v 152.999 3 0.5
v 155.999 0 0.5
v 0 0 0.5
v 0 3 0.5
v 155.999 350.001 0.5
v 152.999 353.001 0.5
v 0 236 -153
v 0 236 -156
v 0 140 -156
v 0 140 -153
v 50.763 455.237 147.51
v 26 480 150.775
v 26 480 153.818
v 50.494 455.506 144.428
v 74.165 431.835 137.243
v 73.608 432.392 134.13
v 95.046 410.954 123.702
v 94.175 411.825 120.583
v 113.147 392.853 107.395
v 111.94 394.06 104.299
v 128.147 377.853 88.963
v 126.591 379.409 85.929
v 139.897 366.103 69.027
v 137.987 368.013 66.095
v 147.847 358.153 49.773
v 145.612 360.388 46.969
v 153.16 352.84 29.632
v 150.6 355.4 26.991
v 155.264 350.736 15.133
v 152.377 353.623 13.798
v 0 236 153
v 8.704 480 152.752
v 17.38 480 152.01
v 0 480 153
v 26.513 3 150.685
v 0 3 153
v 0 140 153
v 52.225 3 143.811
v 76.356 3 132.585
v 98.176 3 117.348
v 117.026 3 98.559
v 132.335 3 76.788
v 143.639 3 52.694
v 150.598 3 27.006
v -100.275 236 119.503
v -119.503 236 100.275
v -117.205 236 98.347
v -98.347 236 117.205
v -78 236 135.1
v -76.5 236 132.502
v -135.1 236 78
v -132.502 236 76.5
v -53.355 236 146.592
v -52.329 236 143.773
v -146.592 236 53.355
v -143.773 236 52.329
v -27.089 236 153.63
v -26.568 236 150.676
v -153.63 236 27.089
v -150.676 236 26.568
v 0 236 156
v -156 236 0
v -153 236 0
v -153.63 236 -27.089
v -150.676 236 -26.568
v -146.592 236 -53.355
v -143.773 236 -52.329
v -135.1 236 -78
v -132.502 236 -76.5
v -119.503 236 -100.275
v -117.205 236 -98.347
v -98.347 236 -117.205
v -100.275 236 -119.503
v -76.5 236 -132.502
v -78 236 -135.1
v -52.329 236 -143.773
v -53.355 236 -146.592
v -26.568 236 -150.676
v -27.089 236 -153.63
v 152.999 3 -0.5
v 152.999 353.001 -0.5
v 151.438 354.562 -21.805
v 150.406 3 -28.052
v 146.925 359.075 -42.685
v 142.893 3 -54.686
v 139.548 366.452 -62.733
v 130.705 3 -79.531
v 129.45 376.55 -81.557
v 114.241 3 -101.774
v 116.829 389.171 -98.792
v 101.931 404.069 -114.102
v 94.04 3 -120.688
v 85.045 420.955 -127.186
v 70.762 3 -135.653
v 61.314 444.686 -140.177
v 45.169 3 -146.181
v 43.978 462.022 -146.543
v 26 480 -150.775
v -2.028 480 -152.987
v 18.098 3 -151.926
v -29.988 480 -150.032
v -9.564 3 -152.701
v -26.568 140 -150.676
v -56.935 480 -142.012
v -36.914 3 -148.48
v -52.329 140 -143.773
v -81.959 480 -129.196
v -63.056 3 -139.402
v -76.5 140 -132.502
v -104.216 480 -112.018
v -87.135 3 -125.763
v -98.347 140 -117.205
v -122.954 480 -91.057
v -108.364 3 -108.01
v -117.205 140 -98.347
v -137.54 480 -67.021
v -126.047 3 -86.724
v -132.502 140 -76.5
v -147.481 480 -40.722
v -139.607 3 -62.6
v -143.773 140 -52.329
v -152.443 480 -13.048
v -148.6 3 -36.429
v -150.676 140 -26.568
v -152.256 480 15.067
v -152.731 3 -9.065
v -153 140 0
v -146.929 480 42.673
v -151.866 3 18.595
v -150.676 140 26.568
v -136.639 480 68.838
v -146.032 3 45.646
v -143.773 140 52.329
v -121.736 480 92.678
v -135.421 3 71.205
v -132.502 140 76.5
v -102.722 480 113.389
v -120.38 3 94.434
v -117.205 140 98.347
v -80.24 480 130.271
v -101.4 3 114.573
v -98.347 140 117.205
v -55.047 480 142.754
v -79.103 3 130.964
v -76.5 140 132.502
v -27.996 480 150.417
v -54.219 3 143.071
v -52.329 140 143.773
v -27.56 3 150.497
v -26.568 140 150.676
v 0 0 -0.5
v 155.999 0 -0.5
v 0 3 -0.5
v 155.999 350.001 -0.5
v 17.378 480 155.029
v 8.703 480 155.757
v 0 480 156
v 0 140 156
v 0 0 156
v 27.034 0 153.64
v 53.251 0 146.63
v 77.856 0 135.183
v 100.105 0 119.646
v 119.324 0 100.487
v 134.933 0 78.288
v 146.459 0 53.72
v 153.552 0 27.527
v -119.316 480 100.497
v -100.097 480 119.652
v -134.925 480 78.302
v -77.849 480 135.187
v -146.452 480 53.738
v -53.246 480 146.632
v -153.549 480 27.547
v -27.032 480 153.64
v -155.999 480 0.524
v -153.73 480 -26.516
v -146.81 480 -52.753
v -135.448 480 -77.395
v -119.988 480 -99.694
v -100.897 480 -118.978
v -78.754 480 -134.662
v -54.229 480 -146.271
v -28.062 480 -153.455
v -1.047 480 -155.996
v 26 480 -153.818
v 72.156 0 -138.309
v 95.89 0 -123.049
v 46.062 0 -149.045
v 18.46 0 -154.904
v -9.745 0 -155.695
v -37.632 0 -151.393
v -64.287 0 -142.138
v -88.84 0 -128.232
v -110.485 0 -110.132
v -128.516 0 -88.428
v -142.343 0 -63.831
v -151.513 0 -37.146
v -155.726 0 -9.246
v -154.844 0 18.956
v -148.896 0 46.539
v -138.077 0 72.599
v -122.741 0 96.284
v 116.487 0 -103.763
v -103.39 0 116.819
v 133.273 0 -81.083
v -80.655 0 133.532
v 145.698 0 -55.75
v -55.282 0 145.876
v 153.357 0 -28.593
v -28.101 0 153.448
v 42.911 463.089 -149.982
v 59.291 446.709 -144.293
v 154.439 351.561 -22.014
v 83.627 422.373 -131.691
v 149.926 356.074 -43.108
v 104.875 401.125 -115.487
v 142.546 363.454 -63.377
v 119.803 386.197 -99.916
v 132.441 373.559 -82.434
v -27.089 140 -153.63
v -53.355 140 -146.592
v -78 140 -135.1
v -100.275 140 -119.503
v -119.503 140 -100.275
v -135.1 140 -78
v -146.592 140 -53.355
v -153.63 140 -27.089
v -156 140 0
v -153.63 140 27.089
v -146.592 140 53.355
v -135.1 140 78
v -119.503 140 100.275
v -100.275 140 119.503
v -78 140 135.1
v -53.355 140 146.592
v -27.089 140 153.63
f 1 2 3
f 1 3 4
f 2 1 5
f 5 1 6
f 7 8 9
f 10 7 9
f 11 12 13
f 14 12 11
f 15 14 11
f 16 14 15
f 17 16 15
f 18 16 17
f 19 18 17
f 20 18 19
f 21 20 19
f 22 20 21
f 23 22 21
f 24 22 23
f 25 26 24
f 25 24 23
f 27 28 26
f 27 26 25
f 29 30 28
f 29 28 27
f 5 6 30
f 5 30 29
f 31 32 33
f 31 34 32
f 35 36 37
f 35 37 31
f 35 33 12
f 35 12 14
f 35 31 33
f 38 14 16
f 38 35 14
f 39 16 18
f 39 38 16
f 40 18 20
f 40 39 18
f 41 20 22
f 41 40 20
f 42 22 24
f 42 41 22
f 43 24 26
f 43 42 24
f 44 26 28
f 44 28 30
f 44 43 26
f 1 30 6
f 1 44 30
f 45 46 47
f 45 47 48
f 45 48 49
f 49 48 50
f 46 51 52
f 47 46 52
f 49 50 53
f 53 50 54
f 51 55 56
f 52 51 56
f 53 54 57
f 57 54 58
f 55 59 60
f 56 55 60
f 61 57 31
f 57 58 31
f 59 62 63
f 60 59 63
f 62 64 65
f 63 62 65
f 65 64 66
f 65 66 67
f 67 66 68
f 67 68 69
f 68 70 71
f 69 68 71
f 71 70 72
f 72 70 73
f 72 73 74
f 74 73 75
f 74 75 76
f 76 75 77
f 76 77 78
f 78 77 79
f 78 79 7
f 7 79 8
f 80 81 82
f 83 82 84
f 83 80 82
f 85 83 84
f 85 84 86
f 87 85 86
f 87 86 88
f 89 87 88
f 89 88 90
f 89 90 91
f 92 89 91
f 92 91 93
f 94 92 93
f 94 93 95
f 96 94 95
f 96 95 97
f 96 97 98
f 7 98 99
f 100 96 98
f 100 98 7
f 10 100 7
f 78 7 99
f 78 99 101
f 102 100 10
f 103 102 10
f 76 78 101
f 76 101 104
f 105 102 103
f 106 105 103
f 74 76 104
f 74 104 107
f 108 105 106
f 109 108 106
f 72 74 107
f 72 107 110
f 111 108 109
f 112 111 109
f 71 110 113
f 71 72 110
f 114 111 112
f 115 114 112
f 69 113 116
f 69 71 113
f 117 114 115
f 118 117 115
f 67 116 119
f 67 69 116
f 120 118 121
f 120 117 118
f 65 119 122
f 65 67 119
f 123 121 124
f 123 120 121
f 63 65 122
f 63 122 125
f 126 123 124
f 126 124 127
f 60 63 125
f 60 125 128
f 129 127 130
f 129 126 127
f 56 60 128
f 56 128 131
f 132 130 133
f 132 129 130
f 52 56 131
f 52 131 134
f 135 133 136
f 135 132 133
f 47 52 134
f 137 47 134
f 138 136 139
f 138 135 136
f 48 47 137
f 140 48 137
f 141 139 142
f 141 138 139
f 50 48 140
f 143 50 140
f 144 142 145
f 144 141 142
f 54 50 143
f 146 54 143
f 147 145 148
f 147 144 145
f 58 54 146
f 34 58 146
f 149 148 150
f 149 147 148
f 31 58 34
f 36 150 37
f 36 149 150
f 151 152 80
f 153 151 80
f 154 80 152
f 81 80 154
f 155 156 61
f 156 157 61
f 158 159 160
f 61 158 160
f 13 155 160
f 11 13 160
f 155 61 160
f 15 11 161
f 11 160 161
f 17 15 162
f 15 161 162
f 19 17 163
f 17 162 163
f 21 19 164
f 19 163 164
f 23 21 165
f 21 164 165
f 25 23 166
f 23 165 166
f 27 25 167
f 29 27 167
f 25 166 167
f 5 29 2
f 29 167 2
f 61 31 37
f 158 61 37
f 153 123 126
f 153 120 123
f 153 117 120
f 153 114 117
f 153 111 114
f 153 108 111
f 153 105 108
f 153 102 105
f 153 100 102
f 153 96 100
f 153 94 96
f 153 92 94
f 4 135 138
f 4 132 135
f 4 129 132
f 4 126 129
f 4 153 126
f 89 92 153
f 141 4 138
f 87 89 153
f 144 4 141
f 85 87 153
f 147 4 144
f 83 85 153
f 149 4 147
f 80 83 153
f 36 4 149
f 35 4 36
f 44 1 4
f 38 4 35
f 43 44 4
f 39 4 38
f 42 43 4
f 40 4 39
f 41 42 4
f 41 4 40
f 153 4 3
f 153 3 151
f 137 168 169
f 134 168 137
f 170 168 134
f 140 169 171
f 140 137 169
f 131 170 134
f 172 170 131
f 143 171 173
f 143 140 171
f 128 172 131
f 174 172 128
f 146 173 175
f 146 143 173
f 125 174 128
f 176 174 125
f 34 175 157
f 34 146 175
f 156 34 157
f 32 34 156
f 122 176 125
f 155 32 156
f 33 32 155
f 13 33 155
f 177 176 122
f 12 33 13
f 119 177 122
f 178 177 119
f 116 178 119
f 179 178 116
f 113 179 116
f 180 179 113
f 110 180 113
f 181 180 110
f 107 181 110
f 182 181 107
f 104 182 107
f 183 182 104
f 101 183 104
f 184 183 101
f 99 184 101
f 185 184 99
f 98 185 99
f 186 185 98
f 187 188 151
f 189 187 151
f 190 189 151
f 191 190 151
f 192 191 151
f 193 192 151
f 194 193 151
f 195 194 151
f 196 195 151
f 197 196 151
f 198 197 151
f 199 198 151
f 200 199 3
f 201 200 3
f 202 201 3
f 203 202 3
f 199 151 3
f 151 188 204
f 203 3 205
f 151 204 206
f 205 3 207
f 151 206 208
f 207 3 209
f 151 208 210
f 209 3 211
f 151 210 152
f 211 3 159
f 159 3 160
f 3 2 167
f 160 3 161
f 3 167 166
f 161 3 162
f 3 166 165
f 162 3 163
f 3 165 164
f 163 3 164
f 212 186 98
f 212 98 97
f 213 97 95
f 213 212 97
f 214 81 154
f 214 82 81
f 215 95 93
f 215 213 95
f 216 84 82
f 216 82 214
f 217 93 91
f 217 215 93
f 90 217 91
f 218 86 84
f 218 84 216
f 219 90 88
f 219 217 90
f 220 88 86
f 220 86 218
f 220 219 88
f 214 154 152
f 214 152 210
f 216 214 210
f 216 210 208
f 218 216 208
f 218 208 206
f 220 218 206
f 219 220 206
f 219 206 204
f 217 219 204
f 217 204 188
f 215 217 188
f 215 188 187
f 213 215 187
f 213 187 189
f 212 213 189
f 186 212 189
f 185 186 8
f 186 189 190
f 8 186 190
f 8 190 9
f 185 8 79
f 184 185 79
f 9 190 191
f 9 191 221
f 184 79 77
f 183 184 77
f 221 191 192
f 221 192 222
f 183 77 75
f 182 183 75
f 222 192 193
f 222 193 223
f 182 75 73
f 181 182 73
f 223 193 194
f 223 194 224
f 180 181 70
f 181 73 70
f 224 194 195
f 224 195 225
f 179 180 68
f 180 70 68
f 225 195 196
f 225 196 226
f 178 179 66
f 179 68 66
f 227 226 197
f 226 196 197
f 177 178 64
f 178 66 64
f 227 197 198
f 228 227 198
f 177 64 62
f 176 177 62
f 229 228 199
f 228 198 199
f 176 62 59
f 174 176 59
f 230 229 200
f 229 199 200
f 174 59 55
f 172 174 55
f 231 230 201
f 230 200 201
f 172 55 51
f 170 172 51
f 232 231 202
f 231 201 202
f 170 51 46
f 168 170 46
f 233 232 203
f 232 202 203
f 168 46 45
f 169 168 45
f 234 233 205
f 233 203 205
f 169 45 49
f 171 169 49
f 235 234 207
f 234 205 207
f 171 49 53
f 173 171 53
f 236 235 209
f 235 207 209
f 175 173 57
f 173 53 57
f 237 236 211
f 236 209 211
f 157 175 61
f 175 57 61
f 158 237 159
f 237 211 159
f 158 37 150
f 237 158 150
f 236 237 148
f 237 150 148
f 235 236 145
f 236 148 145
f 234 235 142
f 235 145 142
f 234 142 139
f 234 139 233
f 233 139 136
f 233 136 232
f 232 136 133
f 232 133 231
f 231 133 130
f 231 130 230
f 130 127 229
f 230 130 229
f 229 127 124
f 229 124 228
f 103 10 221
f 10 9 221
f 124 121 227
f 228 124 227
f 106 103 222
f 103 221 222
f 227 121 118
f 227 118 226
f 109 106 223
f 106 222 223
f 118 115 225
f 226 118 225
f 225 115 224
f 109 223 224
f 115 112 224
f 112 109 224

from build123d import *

# Parameters (mm, degrees)
ESQUISSE1_R                  = 156
BOSS_EXTRU_1_DEPTH           = 520
COQUE1_T                     = 3
ENL_V_MAT_EXTRU_1_DEPTH      = 565.864585542
ENL_V_MAT_EXTRU_1_DEPTH_BACK = 565.864585542
ESQUISSE3_W                  = 1
ESQUISSE3_H                  = 353.000816996
ENL_V_MAT_EXTRU_2_DEPTH      = 529.272656873


with BuildPart() as part:
    # Esquisse1 → Boss.-Extru.1 (new body)
    with BuildSketch(Plane(origin=(0, 0, 0), x_dir=(1, 0, 0), z_dir=(0, 1, 0))):
        with Locations(Location((0, 0, 0), (0, 0, 270))):
            Circle(ESQUISSE1_R)
    extrude(amount=BOSS_EXTRU_1_DEPTH)

    # Coque1 (no face opened: a closed hollow body)
    add(offset(amount=-COQUE1_T, mode=Mode.PRIVATE), mode=Mode.SUBTRACT)

    # Esquisse2 → Enlèv. mat.-Extru.1 (cut, two sides: drawn at the far end of the back side and taken through both)
    with BuildSketch(Plane.XY.offset(-ENL_V_MAT_EXTRU_1_DEPTH_BACK)):
        Polygon((0, 140), (-156.821895425, 140), (-156, 236), (0, 236), align=None)
        Polygon((-156, 520), (-156, 480), (26, 480), (156, 350), (156, 520), align=None)
    extrude(amount=ENL_V_MAT_EXTRU_1_DEPTH + ENL_V_MAT_EXTRU_1_DEPTH_BACK, mode=Mode.SUBTRACT)

    # Esquisse3 → Enlèv. mat.-Extru.2 (cut, through all)
    with BuildSketch(Plane(origin=(0, 0, 0), x_dir=(0, 0, -1), z_dir=(1, 0, 0))):
        with Locations((0, 176.500408498)):
            Rectangle(ESQUISSE3_W, ESQUISSE3_H)
    extrude(amount=ENL_V_MAT_EXTRU_2_DEPTH, mode=Mode.SUBTRACT)


solid = part.part
